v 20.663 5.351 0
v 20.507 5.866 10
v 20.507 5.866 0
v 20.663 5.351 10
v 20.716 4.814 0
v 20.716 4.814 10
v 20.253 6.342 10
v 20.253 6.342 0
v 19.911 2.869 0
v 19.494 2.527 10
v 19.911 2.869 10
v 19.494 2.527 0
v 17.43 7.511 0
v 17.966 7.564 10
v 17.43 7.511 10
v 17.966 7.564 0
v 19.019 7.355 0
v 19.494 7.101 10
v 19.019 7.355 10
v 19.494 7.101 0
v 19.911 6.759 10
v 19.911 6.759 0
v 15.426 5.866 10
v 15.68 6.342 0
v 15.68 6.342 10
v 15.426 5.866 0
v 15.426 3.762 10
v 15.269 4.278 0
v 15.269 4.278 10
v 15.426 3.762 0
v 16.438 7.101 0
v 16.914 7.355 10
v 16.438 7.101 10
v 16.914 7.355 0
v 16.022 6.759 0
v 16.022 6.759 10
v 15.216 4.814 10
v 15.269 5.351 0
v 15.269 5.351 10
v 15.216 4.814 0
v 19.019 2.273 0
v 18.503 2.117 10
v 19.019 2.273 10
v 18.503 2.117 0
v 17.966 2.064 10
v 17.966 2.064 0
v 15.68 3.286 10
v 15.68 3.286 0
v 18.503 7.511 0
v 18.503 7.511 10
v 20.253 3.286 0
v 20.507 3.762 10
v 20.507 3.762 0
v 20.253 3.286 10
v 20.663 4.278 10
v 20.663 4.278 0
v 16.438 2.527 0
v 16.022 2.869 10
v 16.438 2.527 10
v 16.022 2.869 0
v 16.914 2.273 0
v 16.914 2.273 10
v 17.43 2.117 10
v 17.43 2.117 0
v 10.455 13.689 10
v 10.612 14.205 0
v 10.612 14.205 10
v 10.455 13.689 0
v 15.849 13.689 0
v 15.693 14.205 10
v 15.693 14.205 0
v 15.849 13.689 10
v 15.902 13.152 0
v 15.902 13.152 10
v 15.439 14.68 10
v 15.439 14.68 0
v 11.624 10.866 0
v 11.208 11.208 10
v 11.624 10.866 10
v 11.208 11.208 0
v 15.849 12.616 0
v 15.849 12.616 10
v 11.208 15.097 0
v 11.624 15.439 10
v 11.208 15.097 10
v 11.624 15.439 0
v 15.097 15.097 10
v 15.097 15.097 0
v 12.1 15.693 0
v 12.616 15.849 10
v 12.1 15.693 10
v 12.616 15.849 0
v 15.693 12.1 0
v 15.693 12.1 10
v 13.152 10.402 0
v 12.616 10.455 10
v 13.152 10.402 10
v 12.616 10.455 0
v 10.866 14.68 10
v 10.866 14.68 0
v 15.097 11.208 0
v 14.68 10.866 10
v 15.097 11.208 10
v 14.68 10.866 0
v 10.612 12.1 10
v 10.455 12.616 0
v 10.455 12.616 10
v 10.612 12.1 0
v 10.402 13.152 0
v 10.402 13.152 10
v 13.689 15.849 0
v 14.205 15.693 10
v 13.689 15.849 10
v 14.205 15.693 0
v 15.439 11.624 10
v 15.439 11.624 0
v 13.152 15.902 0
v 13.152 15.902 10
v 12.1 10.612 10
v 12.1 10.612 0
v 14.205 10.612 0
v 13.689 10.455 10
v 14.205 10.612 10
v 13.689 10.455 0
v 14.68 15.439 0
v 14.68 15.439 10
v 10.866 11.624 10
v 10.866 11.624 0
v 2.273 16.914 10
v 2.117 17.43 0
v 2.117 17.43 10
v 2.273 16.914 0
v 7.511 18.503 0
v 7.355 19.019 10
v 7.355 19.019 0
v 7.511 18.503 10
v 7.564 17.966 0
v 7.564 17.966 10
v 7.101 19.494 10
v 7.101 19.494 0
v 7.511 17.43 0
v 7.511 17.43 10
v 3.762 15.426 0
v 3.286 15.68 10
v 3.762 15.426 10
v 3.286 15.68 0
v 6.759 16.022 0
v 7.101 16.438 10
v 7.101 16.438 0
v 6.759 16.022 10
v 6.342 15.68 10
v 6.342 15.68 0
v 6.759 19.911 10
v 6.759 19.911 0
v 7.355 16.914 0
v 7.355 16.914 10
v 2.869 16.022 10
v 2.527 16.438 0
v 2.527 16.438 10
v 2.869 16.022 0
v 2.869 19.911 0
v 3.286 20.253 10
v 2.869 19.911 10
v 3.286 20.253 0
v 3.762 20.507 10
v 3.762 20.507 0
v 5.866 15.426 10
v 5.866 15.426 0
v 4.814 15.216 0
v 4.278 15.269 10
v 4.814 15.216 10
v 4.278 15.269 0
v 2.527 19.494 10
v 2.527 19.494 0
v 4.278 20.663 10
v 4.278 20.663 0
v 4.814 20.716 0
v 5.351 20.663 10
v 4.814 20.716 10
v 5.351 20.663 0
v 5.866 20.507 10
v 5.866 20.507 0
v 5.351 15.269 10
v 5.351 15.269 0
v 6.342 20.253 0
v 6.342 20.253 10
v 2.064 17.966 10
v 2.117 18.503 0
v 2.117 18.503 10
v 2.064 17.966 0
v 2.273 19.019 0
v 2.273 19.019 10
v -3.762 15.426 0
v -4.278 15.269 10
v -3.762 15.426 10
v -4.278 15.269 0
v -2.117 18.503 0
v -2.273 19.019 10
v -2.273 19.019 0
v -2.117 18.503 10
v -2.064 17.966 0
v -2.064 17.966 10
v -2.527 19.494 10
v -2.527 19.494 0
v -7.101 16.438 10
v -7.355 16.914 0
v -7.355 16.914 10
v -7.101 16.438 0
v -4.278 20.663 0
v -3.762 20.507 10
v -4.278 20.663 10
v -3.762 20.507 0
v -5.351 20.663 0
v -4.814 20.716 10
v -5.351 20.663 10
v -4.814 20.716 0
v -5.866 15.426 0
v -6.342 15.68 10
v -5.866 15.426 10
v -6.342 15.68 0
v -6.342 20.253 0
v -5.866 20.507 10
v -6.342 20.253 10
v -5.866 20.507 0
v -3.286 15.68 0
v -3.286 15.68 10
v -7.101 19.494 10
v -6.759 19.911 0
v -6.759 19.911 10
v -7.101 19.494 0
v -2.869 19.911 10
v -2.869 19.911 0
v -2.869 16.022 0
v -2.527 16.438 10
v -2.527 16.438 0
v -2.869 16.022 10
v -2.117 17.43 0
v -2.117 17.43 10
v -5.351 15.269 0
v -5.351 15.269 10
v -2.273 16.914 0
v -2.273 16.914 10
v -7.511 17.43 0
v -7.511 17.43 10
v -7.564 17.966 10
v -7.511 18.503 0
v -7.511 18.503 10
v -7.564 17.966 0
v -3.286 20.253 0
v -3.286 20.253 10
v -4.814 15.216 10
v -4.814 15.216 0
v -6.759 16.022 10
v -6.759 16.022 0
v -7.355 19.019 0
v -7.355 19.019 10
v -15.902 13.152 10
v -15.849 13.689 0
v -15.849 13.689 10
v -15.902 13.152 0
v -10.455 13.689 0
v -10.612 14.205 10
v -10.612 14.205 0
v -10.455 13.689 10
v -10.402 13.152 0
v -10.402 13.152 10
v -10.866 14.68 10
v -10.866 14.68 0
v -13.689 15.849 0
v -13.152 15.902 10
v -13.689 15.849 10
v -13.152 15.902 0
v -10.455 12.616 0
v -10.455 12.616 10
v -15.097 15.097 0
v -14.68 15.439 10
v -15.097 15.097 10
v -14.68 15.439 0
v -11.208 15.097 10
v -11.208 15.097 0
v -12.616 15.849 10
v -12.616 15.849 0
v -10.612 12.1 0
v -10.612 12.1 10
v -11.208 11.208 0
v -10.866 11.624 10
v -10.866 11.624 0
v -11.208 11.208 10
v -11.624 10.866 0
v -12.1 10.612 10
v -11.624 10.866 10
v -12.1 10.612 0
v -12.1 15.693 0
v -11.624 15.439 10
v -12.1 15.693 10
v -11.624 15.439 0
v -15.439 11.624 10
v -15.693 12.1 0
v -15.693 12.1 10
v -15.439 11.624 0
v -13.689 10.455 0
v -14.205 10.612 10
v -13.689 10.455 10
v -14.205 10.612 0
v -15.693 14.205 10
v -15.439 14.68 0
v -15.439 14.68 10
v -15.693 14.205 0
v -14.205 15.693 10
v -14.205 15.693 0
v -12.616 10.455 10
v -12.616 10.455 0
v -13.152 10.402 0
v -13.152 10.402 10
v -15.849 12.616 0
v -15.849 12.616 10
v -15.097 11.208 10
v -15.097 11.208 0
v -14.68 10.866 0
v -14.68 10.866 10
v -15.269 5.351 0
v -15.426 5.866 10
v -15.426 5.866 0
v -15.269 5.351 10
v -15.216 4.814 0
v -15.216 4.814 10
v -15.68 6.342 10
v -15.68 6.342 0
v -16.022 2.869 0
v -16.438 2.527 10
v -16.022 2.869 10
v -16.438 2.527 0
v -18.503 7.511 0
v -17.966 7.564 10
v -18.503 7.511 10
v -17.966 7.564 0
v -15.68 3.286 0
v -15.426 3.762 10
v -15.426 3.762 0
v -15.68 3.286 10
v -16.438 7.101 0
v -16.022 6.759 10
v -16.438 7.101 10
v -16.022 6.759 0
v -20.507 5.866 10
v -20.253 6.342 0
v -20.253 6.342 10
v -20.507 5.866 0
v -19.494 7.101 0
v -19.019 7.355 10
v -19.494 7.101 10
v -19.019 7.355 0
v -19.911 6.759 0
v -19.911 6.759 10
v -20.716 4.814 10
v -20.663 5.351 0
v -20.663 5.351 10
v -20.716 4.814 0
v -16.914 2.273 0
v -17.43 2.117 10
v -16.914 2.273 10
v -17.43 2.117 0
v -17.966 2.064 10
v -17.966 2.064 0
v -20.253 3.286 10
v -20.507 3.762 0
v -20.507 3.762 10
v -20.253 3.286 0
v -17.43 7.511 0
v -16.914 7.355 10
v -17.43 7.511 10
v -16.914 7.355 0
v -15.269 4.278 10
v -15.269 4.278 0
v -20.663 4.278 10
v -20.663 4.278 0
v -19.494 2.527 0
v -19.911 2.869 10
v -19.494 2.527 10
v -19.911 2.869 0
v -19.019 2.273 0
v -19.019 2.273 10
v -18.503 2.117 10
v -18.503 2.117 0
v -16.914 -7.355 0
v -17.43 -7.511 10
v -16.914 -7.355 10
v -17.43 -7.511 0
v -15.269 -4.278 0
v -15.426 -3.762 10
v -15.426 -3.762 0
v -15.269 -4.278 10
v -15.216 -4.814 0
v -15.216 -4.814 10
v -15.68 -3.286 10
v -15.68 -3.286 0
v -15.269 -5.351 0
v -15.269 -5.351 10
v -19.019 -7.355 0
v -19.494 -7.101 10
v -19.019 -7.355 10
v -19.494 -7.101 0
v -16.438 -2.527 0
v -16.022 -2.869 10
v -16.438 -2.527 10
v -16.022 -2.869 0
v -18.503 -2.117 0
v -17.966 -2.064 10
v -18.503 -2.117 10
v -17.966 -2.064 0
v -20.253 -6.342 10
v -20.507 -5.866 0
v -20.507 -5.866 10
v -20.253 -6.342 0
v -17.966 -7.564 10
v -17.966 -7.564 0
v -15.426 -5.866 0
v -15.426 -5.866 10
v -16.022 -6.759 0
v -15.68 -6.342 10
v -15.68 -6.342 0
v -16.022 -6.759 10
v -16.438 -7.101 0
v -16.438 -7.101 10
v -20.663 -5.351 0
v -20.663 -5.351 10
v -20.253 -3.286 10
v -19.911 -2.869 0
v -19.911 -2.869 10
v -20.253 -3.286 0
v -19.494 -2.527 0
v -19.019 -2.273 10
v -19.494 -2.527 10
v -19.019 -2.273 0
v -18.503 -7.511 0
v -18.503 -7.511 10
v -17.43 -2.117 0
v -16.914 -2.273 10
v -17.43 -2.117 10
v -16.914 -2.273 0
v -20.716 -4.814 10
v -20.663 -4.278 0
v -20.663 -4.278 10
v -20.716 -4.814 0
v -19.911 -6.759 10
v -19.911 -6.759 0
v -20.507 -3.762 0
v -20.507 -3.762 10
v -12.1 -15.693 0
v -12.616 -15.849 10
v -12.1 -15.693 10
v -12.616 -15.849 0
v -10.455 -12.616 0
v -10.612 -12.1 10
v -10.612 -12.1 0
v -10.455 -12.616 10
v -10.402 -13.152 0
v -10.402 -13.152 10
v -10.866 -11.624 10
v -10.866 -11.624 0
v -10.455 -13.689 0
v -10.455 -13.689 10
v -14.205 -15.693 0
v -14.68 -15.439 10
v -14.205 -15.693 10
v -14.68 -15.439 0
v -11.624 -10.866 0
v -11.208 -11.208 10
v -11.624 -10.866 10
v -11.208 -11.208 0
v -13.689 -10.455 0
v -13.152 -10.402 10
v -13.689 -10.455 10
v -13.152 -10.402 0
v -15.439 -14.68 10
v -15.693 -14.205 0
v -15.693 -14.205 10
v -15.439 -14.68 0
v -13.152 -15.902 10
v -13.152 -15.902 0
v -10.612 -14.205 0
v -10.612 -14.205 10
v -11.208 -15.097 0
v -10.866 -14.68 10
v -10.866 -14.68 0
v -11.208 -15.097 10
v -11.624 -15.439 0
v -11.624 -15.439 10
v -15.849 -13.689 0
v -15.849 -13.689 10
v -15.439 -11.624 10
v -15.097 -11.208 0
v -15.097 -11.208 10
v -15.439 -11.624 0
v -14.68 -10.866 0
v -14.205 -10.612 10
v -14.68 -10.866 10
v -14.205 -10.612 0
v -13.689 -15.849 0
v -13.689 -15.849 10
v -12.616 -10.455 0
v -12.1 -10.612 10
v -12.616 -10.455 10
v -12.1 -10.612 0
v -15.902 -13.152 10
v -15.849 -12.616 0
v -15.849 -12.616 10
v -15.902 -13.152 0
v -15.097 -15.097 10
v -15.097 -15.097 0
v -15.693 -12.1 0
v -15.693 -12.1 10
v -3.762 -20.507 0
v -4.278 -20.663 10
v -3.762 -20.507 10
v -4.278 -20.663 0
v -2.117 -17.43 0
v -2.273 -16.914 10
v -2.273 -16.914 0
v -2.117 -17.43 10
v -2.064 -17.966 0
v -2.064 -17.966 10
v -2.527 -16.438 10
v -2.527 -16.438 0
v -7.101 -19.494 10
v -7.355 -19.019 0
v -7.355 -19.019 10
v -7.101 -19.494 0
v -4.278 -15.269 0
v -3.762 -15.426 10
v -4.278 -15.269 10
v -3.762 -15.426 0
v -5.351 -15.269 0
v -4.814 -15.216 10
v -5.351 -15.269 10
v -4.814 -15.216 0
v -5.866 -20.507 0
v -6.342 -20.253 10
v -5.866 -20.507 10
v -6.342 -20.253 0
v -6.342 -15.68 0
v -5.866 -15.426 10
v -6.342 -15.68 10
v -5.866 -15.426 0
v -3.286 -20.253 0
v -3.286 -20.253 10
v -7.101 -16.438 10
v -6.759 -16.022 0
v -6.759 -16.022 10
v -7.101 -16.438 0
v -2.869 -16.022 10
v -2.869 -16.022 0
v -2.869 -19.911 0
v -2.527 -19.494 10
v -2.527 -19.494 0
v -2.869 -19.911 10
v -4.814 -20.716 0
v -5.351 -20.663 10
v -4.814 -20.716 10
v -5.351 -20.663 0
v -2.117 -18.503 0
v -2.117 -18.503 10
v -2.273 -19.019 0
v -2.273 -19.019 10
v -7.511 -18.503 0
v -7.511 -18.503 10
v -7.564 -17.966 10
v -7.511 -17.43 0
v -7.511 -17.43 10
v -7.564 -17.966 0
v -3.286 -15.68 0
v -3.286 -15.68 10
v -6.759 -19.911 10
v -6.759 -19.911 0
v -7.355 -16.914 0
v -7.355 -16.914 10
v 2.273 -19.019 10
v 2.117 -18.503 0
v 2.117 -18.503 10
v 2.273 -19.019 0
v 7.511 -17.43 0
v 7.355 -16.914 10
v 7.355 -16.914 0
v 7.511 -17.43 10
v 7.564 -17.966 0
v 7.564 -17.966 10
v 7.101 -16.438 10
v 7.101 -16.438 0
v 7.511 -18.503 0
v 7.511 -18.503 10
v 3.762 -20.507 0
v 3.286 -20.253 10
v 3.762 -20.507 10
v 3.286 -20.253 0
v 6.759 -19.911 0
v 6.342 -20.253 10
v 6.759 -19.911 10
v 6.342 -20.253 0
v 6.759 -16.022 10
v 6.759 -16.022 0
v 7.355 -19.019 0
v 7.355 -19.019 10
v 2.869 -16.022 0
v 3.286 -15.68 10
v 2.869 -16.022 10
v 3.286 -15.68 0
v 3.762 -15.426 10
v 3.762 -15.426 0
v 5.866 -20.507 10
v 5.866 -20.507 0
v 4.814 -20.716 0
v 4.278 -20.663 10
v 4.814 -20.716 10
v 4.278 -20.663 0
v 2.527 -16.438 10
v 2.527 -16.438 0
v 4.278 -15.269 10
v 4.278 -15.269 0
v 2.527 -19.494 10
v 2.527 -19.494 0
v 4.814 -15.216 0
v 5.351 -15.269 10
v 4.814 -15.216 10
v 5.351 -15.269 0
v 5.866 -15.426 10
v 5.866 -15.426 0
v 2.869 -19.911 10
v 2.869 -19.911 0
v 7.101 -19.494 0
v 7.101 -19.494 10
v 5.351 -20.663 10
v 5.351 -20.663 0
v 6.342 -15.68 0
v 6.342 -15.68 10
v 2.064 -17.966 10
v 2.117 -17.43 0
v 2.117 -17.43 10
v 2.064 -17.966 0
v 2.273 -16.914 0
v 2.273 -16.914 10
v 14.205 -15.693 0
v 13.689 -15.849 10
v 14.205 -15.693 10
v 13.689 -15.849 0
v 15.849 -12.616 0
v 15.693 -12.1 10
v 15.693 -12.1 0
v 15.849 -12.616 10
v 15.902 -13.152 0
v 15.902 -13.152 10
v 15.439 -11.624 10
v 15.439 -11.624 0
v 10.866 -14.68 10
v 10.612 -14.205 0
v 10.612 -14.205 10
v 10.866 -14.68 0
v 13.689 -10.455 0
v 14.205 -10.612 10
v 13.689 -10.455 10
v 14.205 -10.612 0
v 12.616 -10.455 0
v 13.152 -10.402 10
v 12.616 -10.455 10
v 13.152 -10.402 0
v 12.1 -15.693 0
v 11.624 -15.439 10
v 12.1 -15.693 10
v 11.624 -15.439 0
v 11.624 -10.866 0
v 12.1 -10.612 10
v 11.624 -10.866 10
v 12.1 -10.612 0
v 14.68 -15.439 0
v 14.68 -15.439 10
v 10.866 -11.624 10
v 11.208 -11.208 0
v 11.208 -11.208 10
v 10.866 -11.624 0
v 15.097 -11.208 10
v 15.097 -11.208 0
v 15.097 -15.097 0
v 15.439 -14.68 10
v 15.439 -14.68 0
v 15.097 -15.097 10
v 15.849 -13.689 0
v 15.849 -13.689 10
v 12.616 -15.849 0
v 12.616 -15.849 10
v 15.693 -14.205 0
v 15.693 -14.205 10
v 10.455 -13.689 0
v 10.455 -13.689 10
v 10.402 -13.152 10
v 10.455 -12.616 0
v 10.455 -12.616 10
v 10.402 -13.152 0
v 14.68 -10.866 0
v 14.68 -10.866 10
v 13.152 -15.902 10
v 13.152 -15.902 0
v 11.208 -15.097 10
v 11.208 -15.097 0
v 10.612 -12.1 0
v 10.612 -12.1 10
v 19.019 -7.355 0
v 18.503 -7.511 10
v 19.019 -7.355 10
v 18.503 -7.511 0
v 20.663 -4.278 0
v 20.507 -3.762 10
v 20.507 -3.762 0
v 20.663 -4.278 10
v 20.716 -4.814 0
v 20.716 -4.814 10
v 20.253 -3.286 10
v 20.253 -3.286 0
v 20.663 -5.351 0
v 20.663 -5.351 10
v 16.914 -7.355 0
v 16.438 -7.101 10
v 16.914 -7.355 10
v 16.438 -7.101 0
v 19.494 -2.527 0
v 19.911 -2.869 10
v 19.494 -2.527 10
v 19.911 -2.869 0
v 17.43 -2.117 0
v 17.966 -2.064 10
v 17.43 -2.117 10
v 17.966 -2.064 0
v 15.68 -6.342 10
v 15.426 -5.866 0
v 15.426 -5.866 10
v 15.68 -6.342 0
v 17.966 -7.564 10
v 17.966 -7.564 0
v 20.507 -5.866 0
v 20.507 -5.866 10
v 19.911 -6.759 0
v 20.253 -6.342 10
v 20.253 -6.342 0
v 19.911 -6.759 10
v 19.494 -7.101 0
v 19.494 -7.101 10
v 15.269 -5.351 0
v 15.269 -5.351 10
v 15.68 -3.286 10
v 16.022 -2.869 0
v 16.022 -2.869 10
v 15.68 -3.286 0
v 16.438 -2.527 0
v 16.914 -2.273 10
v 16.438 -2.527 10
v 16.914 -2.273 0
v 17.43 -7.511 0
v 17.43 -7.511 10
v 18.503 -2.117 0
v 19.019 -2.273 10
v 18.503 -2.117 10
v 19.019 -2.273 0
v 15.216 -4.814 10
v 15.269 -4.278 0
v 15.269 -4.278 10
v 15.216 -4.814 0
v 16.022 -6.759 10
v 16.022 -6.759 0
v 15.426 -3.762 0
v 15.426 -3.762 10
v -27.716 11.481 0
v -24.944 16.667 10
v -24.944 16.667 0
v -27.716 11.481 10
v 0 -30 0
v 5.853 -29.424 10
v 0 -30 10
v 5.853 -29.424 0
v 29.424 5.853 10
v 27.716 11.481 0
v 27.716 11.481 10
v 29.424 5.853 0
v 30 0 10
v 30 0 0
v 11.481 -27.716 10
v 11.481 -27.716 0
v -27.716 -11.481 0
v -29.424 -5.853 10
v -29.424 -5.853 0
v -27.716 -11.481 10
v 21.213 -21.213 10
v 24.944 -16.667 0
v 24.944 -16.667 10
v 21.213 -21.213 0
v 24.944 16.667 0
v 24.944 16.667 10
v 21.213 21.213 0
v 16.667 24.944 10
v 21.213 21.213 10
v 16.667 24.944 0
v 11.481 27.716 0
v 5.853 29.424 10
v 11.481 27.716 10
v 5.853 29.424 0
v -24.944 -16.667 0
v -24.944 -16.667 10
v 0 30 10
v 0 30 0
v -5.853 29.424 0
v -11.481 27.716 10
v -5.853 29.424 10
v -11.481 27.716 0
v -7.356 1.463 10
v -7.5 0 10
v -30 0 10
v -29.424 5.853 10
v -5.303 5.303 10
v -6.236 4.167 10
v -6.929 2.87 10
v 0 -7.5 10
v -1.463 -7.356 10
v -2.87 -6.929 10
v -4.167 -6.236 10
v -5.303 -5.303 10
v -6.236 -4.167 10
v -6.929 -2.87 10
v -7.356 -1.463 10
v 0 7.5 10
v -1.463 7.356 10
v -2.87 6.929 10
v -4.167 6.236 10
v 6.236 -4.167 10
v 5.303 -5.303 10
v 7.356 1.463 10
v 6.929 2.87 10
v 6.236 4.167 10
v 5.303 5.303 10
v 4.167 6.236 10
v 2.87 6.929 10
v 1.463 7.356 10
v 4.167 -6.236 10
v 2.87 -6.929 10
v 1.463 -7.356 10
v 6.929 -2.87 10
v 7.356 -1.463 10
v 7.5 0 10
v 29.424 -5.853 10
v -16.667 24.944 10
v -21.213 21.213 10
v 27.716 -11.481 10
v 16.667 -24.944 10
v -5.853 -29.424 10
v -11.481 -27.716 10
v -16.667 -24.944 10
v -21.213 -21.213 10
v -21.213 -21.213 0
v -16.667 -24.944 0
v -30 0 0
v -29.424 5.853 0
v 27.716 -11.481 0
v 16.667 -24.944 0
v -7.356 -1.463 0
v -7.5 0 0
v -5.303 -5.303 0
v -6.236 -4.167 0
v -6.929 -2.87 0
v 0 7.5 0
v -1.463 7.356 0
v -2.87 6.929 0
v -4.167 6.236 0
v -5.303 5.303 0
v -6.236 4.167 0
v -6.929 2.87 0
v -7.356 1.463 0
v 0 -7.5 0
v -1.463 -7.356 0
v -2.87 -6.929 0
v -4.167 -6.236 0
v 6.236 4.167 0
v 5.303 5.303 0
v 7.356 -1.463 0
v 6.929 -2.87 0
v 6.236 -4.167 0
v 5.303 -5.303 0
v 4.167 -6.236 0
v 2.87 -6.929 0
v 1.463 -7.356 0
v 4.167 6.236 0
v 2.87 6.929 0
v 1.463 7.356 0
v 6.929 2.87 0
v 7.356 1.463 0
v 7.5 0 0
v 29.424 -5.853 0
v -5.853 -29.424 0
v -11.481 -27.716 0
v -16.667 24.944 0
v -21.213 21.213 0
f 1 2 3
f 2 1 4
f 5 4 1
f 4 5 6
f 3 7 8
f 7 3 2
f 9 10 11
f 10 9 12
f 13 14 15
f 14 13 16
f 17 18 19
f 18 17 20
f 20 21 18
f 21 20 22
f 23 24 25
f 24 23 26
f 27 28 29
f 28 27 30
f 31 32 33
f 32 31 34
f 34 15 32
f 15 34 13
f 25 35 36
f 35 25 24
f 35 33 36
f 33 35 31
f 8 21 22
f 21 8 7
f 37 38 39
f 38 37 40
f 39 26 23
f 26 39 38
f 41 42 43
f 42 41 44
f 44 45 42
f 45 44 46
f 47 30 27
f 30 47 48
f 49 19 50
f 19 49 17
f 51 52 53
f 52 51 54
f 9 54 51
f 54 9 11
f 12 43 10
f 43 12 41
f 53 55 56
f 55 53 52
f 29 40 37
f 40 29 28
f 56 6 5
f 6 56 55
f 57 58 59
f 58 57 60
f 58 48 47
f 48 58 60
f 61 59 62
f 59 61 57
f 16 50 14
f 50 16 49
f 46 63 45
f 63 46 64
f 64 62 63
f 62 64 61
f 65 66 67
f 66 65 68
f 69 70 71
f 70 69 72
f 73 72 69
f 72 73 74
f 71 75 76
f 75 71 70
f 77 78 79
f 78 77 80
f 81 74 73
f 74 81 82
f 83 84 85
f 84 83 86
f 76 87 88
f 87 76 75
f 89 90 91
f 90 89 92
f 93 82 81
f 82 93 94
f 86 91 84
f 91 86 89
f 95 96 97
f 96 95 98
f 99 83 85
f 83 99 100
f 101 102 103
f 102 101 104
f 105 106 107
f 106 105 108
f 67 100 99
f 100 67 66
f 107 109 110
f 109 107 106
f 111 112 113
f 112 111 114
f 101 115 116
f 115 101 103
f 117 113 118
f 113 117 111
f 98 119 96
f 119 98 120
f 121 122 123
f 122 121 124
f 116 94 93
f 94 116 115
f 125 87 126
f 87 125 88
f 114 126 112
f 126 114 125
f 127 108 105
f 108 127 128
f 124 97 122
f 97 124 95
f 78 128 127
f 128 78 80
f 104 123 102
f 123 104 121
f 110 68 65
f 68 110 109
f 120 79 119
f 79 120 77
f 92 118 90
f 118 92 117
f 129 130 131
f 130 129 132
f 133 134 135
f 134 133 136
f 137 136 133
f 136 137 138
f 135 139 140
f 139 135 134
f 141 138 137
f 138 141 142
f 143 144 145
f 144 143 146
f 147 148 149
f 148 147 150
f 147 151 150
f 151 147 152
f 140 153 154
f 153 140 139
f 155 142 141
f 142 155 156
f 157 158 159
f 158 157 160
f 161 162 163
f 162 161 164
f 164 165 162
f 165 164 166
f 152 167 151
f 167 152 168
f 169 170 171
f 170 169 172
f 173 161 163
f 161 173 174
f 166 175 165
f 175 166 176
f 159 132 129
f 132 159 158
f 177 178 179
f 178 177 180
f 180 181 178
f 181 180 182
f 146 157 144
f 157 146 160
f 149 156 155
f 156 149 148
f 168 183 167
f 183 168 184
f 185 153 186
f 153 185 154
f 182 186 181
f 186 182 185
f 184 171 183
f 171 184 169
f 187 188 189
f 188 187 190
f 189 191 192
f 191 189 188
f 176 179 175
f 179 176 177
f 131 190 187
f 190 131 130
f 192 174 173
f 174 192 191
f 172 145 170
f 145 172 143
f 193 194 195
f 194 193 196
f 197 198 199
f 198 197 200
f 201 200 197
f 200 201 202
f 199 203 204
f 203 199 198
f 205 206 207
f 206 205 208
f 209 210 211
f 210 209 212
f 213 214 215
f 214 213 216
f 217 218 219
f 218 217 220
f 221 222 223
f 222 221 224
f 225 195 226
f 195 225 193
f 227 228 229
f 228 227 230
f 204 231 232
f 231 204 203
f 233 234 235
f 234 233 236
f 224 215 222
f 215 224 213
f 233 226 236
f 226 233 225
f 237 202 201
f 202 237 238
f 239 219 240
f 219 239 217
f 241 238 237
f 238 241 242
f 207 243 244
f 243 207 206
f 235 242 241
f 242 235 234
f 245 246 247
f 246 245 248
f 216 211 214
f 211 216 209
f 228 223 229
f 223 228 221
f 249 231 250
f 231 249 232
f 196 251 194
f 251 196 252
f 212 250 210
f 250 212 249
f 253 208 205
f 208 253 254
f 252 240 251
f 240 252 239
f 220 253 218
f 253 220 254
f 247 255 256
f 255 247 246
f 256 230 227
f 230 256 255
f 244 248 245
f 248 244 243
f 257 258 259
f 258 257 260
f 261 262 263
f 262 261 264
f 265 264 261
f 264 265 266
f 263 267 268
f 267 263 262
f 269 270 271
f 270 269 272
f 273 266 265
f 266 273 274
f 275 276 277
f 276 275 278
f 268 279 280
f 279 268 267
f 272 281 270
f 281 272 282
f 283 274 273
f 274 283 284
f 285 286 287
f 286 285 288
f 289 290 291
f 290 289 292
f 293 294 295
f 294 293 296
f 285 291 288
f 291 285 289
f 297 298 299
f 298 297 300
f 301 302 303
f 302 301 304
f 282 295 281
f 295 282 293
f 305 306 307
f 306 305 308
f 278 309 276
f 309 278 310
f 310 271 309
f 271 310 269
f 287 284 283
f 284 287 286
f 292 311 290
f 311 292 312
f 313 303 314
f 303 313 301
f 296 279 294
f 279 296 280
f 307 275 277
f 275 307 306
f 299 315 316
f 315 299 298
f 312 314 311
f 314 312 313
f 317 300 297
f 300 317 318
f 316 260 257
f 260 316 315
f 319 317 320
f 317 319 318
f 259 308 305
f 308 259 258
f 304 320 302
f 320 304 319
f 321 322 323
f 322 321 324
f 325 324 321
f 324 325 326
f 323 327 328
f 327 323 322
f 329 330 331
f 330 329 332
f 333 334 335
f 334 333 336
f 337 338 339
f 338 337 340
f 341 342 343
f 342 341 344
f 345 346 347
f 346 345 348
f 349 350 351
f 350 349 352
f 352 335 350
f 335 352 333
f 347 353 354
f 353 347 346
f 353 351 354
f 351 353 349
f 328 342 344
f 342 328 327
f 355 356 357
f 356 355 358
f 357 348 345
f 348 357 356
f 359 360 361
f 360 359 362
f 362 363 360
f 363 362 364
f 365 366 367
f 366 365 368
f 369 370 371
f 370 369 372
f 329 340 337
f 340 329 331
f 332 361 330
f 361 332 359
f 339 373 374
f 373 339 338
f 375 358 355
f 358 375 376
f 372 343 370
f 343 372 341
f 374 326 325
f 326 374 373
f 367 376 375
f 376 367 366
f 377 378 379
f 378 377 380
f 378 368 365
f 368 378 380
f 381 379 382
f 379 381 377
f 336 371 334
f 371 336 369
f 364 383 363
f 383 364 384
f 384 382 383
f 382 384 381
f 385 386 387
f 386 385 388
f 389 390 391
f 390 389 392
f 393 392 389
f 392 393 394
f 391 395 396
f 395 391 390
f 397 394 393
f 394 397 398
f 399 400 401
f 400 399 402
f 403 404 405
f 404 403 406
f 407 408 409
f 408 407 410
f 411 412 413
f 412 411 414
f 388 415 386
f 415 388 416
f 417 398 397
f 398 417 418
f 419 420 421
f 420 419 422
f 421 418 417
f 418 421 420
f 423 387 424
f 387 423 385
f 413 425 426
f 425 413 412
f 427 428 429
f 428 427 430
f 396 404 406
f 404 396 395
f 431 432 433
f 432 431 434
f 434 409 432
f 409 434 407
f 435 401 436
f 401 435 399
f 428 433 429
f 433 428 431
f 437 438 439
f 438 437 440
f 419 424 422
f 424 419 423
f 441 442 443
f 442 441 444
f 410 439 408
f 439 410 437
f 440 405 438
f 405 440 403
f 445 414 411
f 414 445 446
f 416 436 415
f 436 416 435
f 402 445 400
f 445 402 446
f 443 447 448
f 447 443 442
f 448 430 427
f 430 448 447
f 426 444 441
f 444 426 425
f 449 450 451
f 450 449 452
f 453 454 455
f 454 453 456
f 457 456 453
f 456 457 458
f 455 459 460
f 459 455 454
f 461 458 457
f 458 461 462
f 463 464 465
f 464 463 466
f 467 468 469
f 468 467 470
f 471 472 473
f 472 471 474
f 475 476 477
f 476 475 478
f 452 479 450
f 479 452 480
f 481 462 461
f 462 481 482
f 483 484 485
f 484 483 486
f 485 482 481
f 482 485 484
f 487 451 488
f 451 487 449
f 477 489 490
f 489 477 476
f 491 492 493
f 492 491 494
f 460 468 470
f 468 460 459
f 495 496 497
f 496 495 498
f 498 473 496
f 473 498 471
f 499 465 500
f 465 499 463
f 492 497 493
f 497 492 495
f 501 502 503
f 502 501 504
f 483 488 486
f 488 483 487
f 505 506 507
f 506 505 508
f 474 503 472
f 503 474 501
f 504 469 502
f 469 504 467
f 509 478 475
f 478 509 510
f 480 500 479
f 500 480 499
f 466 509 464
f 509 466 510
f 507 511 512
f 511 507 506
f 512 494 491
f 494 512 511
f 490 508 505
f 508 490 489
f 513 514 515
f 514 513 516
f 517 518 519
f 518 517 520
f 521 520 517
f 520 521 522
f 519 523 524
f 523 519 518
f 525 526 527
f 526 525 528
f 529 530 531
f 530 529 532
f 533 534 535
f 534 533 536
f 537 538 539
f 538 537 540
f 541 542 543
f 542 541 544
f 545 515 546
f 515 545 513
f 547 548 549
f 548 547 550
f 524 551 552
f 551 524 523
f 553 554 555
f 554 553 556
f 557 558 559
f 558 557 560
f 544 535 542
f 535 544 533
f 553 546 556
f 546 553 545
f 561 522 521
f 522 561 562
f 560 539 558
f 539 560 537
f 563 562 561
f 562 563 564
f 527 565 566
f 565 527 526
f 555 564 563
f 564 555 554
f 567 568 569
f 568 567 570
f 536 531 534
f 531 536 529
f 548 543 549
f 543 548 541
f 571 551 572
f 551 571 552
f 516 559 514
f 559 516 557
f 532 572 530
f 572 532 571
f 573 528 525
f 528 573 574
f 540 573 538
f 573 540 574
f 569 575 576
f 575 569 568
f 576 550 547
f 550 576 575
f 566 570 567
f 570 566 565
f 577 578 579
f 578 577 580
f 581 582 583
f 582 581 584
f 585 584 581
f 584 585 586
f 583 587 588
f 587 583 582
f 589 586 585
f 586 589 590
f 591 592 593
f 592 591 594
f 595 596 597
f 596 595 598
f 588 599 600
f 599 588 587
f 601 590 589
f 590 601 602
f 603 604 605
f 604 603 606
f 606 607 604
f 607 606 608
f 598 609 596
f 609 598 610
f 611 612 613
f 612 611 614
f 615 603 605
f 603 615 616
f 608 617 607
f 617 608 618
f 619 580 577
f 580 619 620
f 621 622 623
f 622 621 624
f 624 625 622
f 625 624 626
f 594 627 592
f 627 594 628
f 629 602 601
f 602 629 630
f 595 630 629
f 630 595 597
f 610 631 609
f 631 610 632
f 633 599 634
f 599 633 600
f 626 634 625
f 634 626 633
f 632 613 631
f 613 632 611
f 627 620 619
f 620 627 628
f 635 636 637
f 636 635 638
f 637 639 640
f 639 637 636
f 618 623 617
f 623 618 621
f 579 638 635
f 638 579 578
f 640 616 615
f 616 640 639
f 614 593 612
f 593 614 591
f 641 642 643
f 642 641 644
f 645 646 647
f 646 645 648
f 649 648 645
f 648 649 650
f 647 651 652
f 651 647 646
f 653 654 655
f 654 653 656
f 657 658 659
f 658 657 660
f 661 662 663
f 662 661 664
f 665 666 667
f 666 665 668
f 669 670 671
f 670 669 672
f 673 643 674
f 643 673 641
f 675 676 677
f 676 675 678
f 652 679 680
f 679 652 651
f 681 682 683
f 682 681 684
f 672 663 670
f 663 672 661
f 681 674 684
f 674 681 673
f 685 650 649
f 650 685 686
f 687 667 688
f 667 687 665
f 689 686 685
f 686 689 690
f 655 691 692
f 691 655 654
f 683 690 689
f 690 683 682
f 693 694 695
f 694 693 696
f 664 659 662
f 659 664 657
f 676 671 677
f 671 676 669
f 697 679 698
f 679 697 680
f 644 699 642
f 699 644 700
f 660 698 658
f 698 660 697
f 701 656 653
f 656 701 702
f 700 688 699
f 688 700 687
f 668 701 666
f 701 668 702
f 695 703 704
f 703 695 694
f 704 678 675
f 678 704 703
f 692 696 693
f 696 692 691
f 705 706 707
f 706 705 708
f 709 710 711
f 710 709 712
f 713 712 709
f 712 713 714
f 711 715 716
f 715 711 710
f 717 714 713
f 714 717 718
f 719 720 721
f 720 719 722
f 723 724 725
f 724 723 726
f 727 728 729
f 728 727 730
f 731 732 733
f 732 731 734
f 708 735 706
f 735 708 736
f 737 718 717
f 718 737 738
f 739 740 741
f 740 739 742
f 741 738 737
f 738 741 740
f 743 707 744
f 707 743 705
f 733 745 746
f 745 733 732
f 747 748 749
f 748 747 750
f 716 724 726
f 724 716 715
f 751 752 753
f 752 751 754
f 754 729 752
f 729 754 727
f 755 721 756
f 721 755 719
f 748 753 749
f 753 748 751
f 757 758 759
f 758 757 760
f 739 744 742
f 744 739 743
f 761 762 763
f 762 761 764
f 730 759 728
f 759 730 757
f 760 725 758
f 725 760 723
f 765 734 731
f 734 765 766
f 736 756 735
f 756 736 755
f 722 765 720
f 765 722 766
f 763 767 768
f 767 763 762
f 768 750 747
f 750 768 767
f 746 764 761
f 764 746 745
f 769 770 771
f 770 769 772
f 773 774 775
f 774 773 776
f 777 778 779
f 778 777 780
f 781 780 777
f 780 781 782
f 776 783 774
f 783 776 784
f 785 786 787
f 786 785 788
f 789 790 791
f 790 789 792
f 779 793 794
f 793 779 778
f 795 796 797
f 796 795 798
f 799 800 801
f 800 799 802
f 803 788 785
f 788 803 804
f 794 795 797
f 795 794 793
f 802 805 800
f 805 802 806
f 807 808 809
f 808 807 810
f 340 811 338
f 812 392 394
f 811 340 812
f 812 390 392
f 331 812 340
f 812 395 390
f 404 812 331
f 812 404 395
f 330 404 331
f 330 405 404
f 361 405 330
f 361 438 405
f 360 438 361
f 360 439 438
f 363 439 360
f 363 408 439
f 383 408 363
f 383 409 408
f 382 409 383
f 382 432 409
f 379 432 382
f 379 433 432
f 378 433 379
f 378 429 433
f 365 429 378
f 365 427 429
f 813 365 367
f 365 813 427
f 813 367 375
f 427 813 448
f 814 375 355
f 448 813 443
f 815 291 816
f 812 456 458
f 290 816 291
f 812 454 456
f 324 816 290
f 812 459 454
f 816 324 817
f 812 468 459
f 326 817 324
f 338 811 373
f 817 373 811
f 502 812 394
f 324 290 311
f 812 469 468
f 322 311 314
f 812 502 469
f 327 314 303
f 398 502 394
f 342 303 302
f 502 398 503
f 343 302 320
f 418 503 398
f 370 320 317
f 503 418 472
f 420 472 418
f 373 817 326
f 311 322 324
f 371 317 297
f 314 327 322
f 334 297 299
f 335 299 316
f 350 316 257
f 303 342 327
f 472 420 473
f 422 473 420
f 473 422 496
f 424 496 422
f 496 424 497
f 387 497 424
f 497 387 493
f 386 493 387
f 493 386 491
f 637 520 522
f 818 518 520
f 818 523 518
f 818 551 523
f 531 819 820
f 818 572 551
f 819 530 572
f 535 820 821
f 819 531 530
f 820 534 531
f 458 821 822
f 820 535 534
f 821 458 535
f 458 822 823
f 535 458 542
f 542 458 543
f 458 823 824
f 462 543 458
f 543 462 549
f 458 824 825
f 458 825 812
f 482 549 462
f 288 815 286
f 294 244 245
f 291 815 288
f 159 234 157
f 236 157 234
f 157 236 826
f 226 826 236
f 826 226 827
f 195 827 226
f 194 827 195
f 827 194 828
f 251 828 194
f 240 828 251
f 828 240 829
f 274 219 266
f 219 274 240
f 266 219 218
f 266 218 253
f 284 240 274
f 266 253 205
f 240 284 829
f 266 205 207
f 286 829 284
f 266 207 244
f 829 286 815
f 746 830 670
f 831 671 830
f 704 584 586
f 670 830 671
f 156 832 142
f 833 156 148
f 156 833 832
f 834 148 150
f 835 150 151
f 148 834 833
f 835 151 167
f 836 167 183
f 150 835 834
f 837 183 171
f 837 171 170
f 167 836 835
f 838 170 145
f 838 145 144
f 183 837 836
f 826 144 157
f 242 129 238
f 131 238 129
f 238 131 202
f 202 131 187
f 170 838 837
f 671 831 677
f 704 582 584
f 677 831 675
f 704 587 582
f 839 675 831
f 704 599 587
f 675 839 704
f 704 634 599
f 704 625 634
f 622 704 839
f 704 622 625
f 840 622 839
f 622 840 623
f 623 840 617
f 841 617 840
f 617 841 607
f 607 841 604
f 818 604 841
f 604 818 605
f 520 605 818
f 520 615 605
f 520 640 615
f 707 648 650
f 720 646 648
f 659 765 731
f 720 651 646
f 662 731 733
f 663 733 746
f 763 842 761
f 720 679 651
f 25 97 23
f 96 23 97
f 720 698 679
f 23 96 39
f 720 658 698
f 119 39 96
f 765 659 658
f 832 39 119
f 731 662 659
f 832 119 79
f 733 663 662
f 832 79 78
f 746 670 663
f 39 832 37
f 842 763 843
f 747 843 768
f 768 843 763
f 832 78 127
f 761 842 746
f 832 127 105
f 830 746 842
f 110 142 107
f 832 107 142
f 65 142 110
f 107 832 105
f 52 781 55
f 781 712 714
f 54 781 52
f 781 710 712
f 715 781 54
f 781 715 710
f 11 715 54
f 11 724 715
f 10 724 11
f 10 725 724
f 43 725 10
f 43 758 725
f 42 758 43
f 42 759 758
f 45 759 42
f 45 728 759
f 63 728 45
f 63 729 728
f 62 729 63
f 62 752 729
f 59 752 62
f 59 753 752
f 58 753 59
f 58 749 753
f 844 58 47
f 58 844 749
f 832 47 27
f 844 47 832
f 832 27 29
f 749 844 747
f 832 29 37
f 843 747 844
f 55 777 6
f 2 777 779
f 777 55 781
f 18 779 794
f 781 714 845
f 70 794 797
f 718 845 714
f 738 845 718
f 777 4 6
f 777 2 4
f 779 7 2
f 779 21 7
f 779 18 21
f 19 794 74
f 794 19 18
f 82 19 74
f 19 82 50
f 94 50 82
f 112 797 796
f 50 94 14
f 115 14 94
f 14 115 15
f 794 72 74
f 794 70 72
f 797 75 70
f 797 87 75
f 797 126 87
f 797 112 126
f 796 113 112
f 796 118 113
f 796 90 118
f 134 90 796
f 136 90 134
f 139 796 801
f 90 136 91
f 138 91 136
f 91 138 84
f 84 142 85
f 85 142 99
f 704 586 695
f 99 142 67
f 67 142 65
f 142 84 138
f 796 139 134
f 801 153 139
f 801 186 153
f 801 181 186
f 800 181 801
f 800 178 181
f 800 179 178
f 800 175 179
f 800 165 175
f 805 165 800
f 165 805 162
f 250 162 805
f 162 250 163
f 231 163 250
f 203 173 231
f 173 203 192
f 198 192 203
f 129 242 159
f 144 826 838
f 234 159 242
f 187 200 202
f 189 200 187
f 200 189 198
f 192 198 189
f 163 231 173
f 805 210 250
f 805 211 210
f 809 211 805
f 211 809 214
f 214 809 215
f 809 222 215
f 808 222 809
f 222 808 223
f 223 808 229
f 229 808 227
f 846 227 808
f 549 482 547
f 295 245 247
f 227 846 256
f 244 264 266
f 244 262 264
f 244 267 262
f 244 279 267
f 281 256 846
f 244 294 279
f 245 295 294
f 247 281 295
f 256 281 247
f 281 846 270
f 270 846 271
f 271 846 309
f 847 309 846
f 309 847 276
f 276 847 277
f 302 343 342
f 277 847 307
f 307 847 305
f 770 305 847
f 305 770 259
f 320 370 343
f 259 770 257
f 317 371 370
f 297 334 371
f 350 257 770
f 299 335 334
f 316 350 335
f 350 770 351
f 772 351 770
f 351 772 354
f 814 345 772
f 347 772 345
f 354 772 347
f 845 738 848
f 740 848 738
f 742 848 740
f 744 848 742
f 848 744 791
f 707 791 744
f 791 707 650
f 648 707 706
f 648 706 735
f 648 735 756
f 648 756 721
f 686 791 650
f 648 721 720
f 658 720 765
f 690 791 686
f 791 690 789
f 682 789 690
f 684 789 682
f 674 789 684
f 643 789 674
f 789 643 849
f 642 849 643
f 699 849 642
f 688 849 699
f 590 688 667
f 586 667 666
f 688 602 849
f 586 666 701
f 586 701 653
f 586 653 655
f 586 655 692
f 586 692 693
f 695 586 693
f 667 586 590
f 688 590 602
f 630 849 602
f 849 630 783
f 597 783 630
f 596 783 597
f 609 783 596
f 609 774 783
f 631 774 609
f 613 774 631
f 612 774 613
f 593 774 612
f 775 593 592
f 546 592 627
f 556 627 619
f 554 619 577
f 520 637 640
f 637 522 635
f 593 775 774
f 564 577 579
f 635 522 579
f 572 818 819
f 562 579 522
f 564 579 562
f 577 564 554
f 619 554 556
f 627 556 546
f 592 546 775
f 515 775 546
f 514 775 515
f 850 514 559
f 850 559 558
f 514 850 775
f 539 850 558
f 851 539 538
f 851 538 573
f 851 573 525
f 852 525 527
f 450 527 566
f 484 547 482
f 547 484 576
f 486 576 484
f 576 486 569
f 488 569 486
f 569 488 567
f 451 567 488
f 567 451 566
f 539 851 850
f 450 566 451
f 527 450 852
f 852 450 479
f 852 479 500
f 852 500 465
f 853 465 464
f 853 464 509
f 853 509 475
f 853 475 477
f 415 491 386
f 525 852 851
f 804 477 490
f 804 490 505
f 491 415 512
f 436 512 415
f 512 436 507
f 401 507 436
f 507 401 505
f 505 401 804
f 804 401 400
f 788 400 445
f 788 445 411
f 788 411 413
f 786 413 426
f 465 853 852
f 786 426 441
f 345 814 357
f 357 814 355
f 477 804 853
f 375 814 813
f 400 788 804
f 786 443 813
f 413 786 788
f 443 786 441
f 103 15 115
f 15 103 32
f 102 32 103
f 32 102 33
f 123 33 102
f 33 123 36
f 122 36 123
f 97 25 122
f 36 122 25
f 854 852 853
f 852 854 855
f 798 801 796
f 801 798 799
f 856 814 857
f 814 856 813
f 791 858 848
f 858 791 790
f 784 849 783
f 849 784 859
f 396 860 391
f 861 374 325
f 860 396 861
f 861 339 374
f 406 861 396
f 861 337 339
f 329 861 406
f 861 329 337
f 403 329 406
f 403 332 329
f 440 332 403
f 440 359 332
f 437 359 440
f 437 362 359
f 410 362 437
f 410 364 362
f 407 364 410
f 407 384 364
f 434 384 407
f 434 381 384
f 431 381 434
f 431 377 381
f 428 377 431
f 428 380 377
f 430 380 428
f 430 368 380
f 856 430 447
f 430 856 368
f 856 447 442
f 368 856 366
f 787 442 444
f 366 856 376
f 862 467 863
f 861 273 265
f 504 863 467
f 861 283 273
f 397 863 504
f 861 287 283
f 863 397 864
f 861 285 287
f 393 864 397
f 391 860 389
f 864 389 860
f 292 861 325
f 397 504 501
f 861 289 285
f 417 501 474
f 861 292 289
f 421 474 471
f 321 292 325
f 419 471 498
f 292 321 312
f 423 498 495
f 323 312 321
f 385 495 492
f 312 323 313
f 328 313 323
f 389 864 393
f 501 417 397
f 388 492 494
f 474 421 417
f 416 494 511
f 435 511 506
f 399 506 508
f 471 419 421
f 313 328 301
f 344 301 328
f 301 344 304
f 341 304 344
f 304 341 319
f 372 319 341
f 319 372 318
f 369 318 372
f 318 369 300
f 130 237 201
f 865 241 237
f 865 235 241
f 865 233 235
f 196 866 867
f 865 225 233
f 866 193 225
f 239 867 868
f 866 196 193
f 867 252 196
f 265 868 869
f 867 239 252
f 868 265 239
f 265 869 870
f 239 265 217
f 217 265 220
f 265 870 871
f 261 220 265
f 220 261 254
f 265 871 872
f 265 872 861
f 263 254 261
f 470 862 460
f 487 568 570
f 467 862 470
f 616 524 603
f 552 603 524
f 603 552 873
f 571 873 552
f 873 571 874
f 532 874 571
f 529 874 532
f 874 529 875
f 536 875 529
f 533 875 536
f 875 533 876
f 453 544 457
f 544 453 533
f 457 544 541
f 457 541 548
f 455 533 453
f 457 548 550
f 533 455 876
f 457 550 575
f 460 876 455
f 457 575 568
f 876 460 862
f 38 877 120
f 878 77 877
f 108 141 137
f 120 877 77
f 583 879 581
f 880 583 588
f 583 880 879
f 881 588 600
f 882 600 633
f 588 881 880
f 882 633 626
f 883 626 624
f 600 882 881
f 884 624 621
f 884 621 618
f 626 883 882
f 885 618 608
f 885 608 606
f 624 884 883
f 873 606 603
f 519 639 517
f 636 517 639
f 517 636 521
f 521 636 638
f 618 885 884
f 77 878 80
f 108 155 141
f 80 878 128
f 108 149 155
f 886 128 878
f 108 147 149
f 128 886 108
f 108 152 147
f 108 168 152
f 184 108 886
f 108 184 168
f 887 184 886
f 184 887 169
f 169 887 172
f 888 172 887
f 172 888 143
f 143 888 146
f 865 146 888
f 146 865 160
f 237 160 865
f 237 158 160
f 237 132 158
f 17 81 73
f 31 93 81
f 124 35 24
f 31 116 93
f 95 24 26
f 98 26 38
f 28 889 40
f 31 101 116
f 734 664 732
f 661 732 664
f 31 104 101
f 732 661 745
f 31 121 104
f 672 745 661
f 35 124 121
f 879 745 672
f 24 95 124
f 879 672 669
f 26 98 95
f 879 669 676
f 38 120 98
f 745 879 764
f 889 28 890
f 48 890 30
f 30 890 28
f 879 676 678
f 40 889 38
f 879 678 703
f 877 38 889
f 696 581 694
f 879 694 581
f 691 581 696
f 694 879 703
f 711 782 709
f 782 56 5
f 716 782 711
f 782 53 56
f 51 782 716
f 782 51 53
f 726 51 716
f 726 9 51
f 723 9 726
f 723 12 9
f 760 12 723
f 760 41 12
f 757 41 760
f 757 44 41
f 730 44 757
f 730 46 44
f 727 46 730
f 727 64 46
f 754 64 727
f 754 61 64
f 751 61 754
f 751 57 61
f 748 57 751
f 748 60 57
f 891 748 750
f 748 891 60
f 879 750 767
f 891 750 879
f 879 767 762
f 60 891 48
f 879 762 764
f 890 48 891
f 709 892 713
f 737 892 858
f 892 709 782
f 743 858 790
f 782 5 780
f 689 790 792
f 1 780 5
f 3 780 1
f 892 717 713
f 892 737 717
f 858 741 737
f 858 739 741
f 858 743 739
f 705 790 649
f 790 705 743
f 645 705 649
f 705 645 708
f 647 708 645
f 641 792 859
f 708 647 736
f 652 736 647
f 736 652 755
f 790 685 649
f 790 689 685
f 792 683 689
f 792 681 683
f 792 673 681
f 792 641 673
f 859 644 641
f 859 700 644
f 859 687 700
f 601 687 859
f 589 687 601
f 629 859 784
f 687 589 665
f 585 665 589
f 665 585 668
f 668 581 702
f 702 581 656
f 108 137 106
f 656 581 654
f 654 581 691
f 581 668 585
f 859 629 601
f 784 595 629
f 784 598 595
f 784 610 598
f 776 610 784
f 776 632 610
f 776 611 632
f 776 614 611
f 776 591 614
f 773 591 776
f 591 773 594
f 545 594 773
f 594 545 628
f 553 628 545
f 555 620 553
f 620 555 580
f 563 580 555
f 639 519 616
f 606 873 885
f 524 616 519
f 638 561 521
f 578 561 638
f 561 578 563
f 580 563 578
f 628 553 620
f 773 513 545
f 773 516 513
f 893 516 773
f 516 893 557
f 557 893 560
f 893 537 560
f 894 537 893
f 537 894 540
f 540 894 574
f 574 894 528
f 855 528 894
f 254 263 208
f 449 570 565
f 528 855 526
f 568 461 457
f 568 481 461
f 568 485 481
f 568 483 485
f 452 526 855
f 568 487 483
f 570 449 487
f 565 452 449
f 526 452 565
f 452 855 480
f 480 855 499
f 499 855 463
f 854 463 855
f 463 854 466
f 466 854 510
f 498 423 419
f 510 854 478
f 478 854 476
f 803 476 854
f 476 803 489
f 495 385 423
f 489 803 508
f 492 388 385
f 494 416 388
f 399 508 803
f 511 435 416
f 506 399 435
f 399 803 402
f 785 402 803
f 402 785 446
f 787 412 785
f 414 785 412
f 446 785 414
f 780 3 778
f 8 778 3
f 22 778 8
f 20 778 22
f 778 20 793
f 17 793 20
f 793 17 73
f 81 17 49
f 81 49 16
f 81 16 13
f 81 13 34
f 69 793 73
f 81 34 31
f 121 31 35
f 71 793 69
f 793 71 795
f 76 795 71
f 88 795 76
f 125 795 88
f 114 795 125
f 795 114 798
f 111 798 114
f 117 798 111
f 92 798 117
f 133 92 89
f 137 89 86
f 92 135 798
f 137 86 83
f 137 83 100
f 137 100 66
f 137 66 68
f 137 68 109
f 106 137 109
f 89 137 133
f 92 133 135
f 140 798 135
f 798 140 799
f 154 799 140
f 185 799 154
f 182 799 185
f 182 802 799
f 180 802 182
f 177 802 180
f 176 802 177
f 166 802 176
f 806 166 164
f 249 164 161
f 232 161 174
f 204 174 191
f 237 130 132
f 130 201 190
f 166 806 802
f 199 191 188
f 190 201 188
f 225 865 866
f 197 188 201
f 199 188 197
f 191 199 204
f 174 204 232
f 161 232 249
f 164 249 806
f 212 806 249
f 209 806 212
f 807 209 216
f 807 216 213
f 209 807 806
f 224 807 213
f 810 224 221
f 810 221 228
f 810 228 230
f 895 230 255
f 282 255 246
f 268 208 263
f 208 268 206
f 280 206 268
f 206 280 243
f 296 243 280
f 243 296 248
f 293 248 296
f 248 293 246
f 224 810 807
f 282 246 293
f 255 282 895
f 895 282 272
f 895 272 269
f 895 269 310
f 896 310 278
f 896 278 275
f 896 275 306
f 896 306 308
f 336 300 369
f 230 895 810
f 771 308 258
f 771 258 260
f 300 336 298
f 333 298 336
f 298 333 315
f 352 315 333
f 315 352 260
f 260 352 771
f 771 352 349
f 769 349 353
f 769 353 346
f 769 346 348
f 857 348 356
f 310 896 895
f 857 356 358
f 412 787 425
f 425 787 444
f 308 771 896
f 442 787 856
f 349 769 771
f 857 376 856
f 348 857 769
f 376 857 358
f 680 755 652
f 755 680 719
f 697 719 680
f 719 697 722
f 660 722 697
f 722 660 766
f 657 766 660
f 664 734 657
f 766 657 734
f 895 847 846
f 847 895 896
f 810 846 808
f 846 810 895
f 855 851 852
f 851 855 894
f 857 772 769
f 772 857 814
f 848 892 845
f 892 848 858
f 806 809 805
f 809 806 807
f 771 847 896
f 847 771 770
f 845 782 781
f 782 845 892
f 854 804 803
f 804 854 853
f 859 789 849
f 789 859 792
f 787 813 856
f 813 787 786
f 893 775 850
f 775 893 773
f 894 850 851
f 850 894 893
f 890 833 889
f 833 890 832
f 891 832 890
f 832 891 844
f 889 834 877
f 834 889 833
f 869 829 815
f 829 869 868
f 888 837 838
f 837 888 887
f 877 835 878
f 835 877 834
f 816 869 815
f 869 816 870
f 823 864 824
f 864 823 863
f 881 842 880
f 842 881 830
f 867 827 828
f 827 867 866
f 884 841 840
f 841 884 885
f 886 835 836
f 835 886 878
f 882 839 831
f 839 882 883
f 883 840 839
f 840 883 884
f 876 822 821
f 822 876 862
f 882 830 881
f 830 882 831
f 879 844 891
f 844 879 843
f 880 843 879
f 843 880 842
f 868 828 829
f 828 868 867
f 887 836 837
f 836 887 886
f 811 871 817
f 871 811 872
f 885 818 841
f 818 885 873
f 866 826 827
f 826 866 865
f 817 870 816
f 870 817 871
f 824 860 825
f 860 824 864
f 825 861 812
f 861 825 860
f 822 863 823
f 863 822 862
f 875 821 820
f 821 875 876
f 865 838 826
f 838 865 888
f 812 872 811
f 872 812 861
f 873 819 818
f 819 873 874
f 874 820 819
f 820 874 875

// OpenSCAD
$fn = 32;

// ----------------------------------------------------------------------
// Flange Ø60 x 10
// 12 holes on a Ø37.2 bolt circle, bolted joints
// ----------------------------------------------------------------------

// --- parameters (mm) ---
flange_d = 60;   // outside diameter of the flange
thickness = 10;  // flange thickness
holes = 12;      // number of bolt holes
pcd = 37.2;      // bolt circle diameter
start_deg = 15;  // angle of the first hole, from +X
hole_d = 5.5;    // bolt hole diameter
bore_d = 15;     // central through bore
hub_d = 25;      // hub outside diameter
hub_h = 0;       // hub height above the flange face (0 = no hub)

// --- derived feature positions (mm) ---
height = thickness + hub_h;  // = 10   overall height of the part
pcd_r = pcd / 2;             // = 18.6   bolt circle radius
hole_step = 360 / holes;     // = 30   angular pitch
feature_centers = [
  [pcd_r * cos(start_deg + 0 * hole_step), pcd_r * sin(start_deg + 0 * hole_step)],
  [pcd_r * cos(start_deg + 1 * hole_step), pcd_r * sin(start_deg + 1 * hole_step)],
  [pcd_r * cos(start_deg + 2 * hole_step), pcd_r * sin(start_deg + 2 * hole_step)],
  [pcd_r * cos(start_deg + 3 * hole_step), pcd_r * sin(start_deg + 3 * hole_step)],
  [pcd_r * cos(start_deg + 4 * hole_step), pcd_r * sin(start_deg + 4 * hole_step)],
  [pcd_r * cos(start_deg + 5 * hole_step), pcd_r * sin(start_deg + 5 * hole_step)],
  [pcd_r * cos(start_deg + 6 * hole_step), pcd_r * sin(start_deg + 6 * hole_step)],
  [pcd_r * cos(start_deg + 7 * hole_step), pcd_r * sin(start_deg + 7 * hole_step)],
  [pcd_r * cos(start_deg + 8 * hole_step), pcd_r * sin(start_deg + 8 * hole_step)],
  [pcd_r * cos(start_deg + 9 * hole_step), pcd_r * sin(start_deg + 9 * hole_step)],
  [pcd_r * cos(start_deg + 10 * hole_step), pcd_r * sin(start_deg + 10 * hole_step)],
  [pcd_r * cos(start_deg + 11 * hole_step), pcd_r * sin(start_deg + 11 * hole_step)]
];   // bolt hole centres on the pitch circle

// flange disc, every hole and the bore cut straight through
difference() {
  union() {
    cylinder(d = flange_d, h = thickness);
  }
  translate([0, 0, -1]) cylinder(d = bore_d, h = height + 2);  // bore, through
  for (centre = feature_centers)
    translate([centre[0], centre[1], -1]) cylinder(d = hole_d, h = thickness + 2);
}
